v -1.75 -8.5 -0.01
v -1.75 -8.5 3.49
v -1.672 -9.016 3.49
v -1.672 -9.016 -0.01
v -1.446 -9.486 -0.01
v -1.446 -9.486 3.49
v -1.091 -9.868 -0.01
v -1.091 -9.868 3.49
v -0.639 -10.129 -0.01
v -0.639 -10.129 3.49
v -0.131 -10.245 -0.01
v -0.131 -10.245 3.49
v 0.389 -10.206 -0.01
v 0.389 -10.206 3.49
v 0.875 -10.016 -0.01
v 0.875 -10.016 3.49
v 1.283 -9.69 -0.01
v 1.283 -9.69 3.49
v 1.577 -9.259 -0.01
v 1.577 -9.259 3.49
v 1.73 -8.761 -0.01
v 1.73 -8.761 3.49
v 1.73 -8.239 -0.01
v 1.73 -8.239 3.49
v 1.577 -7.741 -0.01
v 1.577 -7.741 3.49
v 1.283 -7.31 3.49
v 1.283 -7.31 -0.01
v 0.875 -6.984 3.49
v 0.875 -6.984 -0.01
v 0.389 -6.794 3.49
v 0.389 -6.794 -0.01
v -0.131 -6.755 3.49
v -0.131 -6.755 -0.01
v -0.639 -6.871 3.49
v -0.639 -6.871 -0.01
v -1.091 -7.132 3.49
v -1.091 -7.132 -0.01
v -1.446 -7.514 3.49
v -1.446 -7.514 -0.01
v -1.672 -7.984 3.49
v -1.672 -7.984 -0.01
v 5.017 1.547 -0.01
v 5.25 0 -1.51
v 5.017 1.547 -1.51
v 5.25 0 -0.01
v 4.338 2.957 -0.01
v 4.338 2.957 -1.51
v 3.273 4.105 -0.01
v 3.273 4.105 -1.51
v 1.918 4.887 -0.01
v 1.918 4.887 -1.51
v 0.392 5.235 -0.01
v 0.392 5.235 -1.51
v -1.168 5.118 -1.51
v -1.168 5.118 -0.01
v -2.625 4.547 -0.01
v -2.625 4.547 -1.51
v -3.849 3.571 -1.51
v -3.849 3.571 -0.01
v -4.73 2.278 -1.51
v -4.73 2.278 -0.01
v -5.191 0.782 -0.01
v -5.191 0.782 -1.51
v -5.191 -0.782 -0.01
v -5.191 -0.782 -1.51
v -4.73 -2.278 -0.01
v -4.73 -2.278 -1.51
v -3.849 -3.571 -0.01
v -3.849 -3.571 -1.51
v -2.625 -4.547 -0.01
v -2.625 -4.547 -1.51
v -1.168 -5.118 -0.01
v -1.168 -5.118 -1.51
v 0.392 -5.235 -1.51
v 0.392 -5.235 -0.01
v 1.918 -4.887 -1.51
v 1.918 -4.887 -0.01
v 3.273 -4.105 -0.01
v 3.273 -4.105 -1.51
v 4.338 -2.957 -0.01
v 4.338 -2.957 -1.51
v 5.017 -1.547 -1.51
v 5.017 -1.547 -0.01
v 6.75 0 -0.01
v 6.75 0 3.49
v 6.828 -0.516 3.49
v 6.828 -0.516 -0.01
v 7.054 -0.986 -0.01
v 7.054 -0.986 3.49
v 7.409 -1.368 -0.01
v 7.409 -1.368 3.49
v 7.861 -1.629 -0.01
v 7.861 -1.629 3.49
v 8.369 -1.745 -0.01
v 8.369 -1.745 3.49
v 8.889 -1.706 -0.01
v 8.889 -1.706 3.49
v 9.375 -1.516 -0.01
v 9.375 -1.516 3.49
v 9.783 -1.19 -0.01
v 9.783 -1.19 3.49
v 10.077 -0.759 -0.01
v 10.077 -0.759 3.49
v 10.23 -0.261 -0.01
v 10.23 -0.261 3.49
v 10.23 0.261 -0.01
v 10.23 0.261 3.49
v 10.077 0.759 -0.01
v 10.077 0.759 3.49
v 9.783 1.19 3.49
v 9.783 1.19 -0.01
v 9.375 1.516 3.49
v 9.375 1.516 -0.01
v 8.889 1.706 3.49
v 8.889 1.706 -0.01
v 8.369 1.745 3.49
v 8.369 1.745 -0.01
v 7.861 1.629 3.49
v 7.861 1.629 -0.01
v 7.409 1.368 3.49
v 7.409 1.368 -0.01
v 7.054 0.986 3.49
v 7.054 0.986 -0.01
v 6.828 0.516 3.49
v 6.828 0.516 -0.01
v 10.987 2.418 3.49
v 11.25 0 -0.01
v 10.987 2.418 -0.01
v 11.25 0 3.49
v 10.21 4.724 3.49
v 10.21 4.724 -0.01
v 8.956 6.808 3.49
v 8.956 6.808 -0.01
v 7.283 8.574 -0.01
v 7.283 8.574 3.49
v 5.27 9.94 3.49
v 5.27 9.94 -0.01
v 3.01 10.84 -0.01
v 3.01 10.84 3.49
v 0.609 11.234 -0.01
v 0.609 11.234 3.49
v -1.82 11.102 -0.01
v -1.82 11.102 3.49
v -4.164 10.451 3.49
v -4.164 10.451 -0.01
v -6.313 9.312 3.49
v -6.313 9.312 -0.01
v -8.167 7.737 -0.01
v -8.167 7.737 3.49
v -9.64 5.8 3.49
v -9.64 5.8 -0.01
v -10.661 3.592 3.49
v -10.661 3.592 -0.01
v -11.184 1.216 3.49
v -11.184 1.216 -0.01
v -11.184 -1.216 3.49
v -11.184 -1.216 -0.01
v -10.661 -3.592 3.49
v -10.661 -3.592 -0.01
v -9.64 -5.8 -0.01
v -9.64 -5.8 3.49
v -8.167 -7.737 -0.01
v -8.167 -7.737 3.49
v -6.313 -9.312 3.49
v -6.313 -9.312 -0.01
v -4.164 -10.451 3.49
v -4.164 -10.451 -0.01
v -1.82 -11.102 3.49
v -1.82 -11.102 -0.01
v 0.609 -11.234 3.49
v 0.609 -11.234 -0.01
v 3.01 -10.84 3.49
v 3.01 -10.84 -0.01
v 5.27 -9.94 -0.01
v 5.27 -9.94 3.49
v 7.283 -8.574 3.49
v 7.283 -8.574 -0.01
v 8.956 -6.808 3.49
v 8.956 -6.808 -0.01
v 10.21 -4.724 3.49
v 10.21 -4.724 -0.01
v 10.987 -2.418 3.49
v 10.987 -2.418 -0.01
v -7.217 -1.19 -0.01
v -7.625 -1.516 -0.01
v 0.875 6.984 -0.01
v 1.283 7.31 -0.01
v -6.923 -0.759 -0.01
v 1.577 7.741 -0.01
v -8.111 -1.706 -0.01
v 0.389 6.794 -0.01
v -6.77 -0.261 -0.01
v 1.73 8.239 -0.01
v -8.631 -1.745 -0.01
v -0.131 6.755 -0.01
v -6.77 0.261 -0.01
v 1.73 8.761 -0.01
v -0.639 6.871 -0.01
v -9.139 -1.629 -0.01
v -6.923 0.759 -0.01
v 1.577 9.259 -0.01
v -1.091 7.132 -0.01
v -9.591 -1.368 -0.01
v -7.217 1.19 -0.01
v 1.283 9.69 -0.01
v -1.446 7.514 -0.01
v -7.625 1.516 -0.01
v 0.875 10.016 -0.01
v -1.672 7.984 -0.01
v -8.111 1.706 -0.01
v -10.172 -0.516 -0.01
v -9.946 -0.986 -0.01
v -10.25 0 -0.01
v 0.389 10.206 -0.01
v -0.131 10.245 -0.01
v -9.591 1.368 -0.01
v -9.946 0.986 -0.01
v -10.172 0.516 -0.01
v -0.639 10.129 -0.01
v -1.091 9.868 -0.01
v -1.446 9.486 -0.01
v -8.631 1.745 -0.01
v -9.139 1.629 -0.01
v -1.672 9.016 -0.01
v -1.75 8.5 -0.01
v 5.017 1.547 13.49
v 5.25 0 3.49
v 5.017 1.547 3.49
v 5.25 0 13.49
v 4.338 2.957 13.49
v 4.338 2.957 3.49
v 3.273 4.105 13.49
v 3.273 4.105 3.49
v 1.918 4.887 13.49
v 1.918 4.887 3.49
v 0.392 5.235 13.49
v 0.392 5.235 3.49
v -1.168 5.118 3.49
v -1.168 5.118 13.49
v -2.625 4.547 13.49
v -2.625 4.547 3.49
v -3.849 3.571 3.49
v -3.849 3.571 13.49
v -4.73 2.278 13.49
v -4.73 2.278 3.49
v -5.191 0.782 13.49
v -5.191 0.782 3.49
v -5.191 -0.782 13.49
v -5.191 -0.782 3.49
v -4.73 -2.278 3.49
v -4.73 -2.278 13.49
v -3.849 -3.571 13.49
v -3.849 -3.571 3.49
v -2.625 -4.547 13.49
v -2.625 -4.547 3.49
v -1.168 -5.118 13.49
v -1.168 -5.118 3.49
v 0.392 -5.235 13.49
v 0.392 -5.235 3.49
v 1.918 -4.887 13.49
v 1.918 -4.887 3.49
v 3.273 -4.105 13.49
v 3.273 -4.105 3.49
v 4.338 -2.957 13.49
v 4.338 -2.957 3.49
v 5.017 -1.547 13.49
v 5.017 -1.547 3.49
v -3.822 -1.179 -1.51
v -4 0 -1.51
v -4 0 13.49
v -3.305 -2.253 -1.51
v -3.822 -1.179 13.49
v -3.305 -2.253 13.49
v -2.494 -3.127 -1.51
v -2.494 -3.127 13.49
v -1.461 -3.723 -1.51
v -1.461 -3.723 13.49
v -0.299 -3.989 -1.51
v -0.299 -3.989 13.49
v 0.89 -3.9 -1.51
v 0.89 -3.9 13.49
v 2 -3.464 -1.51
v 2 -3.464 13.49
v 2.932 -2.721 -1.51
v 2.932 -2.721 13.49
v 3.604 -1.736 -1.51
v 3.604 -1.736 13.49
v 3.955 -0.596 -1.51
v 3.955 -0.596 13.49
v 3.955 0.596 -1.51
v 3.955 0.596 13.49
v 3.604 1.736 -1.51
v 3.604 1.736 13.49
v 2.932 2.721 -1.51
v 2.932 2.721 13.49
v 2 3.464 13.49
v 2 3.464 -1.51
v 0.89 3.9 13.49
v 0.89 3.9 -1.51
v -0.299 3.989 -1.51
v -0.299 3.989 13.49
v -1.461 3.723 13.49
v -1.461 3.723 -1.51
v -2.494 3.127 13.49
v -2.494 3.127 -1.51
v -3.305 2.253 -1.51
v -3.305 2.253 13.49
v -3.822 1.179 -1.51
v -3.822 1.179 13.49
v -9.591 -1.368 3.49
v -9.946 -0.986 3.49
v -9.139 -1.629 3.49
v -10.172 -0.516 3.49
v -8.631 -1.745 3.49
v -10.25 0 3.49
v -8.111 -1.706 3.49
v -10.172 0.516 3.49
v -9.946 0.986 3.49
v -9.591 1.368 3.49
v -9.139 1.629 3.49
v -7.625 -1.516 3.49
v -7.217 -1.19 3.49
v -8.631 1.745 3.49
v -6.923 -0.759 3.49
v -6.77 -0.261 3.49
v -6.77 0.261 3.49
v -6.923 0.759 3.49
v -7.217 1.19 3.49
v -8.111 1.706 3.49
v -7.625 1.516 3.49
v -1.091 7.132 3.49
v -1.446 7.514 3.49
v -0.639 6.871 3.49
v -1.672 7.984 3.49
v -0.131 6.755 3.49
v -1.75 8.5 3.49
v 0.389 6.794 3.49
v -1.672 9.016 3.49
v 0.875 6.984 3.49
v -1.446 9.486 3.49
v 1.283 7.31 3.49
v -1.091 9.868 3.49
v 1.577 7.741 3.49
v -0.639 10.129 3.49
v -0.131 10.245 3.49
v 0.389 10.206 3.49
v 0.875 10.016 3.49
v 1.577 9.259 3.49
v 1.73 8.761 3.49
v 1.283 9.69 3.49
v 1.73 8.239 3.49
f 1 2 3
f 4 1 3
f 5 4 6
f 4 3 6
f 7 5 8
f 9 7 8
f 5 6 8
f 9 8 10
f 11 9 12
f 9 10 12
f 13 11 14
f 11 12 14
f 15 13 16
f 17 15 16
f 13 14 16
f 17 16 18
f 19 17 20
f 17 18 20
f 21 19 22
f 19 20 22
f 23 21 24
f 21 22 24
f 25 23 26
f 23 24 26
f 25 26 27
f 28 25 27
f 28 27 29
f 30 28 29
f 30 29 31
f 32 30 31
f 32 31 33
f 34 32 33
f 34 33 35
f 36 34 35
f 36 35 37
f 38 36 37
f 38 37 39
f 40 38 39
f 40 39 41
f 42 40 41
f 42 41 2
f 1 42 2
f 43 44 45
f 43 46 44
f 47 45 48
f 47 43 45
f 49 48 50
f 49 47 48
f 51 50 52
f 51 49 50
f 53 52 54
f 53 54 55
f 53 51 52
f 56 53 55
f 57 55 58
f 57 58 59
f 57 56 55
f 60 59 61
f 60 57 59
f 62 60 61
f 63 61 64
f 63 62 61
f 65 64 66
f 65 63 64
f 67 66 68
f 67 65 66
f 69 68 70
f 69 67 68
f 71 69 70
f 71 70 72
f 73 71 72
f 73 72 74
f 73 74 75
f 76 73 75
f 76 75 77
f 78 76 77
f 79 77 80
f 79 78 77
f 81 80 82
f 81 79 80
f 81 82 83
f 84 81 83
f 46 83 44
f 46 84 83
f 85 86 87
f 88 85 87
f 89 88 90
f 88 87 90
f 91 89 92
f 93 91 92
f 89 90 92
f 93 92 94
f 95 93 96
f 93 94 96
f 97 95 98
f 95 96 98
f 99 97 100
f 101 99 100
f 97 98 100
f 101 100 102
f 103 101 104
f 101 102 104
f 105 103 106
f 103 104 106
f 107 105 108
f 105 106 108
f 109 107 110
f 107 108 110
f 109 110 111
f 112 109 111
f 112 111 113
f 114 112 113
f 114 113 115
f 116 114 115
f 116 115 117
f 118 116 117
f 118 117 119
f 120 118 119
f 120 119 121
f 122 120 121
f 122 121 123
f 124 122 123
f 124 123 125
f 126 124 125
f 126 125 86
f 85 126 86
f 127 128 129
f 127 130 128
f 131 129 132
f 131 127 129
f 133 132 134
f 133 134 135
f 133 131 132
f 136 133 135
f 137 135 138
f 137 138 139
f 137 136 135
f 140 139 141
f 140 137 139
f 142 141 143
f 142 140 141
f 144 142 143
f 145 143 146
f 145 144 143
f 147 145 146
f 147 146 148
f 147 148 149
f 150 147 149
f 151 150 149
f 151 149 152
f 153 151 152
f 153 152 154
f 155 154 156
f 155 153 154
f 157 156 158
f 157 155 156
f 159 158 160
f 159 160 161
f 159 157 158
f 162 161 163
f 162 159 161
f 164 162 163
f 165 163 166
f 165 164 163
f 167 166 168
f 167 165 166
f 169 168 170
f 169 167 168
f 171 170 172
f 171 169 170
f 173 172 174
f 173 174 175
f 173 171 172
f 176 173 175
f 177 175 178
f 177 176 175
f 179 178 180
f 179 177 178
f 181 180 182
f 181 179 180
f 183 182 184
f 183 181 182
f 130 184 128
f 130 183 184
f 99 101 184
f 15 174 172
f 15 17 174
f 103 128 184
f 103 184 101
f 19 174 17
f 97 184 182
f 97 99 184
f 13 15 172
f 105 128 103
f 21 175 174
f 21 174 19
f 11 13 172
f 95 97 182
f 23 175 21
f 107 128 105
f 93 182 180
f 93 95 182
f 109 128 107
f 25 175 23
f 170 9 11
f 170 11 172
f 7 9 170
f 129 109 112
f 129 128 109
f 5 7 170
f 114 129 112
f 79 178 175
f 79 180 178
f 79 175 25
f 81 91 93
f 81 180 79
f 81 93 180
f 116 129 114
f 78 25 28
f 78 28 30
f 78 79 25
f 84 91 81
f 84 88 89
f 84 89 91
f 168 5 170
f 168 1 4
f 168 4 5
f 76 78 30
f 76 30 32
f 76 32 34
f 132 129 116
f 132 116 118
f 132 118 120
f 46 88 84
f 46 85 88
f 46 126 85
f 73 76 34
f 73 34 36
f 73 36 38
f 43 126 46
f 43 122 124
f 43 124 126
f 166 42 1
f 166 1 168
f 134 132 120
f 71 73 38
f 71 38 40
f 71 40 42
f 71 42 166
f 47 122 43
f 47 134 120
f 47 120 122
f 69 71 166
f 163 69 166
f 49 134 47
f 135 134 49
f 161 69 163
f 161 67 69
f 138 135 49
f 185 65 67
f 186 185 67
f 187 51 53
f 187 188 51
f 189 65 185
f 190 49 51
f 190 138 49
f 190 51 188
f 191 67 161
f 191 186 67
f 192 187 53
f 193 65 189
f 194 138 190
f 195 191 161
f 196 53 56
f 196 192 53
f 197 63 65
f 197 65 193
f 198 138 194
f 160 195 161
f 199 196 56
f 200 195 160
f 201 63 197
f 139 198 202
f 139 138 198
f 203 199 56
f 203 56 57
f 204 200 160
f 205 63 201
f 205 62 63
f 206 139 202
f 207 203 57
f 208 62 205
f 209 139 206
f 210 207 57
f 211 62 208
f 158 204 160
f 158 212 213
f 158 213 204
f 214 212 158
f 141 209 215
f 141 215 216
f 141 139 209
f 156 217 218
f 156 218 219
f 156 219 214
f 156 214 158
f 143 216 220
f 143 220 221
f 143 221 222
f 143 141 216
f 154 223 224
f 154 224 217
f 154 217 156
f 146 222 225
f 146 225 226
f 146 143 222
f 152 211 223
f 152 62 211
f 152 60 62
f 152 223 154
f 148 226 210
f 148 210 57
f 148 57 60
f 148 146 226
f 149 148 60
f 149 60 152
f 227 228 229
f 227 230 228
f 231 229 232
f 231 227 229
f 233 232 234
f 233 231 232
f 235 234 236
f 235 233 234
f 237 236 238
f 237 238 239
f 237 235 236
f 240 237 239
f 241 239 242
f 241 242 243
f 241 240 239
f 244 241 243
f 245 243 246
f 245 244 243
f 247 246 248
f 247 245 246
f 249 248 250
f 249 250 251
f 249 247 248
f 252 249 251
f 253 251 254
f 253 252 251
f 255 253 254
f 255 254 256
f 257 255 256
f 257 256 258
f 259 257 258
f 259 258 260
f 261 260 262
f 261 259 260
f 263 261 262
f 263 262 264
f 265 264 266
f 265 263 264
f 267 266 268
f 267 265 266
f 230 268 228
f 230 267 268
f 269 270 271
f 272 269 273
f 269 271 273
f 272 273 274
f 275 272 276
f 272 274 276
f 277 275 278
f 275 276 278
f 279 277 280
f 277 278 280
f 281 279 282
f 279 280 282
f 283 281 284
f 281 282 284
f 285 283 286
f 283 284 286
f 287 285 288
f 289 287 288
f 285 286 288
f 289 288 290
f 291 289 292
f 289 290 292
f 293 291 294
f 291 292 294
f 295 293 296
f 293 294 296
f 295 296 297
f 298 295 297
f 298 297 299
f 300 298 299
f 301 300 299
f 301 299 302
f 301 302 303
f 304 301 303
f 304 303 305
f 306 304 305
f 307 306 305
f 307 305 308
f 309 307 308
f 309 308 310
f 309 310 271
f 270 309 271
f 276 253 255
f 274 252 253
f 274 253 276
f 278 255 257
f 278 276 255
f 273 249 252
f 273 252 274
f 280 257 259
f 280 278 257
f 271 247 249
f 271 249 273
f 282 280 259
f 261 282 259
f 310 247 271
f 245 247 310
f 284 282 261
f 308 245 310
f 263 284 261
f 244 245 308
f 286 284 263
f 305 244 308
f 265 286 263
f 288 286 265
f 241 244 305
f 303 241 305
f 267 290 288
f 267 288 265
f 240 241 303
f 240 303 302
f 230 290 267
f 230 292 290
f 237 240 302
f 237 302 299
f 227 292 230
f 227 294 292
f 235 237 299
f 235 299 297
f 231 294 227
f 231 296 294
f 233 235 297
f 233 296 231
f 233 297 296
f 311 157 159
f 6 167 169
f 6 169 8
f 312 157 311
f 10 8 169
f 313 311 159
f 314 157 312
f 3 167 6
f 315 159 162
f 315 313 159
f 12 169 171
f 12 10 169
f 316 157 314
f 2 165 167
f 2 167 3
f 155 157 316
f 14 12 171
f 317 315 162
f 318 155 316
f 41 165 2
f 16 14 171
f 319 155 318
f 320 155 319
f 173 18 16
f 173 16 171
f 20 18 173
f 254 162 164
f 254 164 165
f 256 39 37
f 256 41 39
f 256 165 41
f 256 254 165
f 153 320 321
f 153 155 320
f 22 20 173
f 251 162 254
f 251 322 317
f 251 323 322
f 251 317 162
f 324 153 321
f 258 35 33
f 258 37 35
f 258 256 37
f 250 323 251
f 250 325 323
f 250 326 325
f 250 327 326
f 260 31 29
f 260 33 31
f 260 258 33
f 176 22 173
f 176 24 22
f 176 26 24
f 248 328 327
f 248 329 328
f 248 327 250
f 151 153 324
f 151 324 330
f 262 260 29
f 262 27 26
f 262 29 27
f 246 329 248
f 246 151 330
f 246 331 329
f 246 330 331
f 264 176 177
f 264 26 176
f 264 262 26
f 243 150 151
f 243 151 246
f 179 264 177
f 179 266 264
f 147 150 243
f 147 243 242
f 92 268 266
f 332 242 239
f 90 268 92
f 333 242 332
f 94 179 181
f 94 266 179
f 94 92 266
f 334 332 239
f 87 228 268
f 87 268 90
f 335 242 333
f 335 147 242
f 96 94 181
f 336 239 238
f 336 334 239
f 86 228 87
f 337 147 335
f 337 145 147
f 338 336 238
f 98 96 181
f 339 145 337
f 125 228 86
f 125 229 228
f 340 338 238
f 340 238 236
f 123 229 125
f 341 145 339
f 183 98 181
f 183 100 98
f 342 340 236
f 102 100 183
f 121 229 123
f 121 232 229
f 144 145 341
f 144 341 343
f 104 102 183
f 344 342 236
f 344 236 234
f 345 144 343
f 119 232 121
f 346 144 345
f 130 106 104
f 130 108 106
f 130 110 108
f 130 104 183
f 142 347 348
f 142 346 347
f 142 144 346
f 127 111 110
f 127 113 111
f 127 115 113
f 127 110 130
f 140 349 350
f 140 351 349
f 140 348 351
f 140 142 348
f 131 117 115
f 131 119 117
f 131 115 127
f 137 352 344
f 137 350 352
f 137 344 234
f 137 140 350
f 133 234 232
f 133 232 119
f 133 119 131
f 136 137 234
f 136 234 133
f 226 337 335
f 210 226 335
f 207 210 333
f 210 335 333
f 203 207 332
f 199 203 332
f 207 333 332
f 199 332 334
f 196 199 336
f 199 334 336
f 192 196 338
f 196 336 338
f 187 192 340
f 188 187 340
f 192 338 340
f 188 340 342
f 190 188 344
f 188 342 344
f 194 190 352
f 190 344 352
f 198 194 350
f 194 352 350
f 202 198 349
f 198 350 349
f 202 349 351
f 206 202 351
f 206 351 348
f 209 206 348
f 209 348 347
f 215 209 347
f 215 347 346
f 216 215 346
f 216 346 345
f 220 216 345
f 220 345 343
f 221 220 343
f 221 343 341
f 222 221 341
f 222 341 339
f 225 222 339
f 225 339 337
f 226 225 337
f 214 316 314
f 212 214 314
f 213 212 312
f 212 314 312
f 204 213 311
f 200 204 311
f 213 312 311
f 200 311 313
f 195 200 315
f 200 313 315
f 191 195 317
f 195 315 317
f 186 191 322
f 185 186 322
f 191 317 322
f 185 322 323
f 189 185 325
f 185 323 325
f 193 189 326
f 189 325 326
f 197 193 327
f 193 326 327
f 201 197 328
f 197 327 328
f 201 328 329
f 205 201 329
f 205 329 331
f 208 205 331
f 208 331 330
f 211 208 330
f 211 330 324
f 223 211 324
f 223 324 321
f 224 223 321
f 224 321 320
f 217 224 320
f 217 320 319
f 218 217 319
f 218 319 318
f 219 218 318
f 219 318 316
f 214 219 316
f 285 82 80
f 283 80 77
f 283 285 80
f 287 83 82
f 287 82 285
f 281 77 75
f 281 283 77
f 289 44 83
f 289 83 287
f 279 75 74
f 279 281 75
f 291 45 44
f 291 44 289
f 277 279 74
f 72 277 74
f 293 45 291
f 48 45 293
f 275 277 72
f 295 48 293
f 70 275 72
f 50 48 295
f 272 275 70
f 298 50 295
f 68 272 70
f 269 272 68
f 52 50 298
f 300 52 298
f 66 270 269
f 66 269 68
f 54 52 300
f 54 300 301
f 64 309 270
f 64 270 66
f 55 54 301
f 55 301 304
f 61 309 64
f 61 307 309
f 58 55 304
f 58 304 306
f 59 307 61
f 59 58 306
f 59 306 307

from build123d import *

# Parameters (mm, degrees)
F3_D = 8
F5_D = 3.5


with BuildPart() as f1:
    # F0 (on Front) → F1 (revolve)
    with BuildSketch(Plane.XZ):
        Polygon((11.25, -0.01), (11.25, 3.49), (5.25, 3.49), (5.25, 13.49), (0, 13.49), (0, -1.51), (5.25, -1.51), (5.25, -0.01), align=None)
    revolve(axis=Axis((0, 0, 5.99), (0, 0, 1)))

    # F3 (through all)
    with Locations(Plane(origin=(0, 0, -1.51), x_dir=(1, 0, 0), z_dir=(0, 0, -1))):
        with Locations((0, 0)):
            Hole(F3_D / 2)

    # F5 (through all)
    with Locations(Plane(origin=(0, 0, -0.01), x_dir=(1, 0, 0), z_dir=(0, 0, -1))):
        with Locations((0, 8.5), (8.5, 0), (0, -8.5), (-8.5, 0)):
            Hole(F5_D / 2)


solid = f1.part
